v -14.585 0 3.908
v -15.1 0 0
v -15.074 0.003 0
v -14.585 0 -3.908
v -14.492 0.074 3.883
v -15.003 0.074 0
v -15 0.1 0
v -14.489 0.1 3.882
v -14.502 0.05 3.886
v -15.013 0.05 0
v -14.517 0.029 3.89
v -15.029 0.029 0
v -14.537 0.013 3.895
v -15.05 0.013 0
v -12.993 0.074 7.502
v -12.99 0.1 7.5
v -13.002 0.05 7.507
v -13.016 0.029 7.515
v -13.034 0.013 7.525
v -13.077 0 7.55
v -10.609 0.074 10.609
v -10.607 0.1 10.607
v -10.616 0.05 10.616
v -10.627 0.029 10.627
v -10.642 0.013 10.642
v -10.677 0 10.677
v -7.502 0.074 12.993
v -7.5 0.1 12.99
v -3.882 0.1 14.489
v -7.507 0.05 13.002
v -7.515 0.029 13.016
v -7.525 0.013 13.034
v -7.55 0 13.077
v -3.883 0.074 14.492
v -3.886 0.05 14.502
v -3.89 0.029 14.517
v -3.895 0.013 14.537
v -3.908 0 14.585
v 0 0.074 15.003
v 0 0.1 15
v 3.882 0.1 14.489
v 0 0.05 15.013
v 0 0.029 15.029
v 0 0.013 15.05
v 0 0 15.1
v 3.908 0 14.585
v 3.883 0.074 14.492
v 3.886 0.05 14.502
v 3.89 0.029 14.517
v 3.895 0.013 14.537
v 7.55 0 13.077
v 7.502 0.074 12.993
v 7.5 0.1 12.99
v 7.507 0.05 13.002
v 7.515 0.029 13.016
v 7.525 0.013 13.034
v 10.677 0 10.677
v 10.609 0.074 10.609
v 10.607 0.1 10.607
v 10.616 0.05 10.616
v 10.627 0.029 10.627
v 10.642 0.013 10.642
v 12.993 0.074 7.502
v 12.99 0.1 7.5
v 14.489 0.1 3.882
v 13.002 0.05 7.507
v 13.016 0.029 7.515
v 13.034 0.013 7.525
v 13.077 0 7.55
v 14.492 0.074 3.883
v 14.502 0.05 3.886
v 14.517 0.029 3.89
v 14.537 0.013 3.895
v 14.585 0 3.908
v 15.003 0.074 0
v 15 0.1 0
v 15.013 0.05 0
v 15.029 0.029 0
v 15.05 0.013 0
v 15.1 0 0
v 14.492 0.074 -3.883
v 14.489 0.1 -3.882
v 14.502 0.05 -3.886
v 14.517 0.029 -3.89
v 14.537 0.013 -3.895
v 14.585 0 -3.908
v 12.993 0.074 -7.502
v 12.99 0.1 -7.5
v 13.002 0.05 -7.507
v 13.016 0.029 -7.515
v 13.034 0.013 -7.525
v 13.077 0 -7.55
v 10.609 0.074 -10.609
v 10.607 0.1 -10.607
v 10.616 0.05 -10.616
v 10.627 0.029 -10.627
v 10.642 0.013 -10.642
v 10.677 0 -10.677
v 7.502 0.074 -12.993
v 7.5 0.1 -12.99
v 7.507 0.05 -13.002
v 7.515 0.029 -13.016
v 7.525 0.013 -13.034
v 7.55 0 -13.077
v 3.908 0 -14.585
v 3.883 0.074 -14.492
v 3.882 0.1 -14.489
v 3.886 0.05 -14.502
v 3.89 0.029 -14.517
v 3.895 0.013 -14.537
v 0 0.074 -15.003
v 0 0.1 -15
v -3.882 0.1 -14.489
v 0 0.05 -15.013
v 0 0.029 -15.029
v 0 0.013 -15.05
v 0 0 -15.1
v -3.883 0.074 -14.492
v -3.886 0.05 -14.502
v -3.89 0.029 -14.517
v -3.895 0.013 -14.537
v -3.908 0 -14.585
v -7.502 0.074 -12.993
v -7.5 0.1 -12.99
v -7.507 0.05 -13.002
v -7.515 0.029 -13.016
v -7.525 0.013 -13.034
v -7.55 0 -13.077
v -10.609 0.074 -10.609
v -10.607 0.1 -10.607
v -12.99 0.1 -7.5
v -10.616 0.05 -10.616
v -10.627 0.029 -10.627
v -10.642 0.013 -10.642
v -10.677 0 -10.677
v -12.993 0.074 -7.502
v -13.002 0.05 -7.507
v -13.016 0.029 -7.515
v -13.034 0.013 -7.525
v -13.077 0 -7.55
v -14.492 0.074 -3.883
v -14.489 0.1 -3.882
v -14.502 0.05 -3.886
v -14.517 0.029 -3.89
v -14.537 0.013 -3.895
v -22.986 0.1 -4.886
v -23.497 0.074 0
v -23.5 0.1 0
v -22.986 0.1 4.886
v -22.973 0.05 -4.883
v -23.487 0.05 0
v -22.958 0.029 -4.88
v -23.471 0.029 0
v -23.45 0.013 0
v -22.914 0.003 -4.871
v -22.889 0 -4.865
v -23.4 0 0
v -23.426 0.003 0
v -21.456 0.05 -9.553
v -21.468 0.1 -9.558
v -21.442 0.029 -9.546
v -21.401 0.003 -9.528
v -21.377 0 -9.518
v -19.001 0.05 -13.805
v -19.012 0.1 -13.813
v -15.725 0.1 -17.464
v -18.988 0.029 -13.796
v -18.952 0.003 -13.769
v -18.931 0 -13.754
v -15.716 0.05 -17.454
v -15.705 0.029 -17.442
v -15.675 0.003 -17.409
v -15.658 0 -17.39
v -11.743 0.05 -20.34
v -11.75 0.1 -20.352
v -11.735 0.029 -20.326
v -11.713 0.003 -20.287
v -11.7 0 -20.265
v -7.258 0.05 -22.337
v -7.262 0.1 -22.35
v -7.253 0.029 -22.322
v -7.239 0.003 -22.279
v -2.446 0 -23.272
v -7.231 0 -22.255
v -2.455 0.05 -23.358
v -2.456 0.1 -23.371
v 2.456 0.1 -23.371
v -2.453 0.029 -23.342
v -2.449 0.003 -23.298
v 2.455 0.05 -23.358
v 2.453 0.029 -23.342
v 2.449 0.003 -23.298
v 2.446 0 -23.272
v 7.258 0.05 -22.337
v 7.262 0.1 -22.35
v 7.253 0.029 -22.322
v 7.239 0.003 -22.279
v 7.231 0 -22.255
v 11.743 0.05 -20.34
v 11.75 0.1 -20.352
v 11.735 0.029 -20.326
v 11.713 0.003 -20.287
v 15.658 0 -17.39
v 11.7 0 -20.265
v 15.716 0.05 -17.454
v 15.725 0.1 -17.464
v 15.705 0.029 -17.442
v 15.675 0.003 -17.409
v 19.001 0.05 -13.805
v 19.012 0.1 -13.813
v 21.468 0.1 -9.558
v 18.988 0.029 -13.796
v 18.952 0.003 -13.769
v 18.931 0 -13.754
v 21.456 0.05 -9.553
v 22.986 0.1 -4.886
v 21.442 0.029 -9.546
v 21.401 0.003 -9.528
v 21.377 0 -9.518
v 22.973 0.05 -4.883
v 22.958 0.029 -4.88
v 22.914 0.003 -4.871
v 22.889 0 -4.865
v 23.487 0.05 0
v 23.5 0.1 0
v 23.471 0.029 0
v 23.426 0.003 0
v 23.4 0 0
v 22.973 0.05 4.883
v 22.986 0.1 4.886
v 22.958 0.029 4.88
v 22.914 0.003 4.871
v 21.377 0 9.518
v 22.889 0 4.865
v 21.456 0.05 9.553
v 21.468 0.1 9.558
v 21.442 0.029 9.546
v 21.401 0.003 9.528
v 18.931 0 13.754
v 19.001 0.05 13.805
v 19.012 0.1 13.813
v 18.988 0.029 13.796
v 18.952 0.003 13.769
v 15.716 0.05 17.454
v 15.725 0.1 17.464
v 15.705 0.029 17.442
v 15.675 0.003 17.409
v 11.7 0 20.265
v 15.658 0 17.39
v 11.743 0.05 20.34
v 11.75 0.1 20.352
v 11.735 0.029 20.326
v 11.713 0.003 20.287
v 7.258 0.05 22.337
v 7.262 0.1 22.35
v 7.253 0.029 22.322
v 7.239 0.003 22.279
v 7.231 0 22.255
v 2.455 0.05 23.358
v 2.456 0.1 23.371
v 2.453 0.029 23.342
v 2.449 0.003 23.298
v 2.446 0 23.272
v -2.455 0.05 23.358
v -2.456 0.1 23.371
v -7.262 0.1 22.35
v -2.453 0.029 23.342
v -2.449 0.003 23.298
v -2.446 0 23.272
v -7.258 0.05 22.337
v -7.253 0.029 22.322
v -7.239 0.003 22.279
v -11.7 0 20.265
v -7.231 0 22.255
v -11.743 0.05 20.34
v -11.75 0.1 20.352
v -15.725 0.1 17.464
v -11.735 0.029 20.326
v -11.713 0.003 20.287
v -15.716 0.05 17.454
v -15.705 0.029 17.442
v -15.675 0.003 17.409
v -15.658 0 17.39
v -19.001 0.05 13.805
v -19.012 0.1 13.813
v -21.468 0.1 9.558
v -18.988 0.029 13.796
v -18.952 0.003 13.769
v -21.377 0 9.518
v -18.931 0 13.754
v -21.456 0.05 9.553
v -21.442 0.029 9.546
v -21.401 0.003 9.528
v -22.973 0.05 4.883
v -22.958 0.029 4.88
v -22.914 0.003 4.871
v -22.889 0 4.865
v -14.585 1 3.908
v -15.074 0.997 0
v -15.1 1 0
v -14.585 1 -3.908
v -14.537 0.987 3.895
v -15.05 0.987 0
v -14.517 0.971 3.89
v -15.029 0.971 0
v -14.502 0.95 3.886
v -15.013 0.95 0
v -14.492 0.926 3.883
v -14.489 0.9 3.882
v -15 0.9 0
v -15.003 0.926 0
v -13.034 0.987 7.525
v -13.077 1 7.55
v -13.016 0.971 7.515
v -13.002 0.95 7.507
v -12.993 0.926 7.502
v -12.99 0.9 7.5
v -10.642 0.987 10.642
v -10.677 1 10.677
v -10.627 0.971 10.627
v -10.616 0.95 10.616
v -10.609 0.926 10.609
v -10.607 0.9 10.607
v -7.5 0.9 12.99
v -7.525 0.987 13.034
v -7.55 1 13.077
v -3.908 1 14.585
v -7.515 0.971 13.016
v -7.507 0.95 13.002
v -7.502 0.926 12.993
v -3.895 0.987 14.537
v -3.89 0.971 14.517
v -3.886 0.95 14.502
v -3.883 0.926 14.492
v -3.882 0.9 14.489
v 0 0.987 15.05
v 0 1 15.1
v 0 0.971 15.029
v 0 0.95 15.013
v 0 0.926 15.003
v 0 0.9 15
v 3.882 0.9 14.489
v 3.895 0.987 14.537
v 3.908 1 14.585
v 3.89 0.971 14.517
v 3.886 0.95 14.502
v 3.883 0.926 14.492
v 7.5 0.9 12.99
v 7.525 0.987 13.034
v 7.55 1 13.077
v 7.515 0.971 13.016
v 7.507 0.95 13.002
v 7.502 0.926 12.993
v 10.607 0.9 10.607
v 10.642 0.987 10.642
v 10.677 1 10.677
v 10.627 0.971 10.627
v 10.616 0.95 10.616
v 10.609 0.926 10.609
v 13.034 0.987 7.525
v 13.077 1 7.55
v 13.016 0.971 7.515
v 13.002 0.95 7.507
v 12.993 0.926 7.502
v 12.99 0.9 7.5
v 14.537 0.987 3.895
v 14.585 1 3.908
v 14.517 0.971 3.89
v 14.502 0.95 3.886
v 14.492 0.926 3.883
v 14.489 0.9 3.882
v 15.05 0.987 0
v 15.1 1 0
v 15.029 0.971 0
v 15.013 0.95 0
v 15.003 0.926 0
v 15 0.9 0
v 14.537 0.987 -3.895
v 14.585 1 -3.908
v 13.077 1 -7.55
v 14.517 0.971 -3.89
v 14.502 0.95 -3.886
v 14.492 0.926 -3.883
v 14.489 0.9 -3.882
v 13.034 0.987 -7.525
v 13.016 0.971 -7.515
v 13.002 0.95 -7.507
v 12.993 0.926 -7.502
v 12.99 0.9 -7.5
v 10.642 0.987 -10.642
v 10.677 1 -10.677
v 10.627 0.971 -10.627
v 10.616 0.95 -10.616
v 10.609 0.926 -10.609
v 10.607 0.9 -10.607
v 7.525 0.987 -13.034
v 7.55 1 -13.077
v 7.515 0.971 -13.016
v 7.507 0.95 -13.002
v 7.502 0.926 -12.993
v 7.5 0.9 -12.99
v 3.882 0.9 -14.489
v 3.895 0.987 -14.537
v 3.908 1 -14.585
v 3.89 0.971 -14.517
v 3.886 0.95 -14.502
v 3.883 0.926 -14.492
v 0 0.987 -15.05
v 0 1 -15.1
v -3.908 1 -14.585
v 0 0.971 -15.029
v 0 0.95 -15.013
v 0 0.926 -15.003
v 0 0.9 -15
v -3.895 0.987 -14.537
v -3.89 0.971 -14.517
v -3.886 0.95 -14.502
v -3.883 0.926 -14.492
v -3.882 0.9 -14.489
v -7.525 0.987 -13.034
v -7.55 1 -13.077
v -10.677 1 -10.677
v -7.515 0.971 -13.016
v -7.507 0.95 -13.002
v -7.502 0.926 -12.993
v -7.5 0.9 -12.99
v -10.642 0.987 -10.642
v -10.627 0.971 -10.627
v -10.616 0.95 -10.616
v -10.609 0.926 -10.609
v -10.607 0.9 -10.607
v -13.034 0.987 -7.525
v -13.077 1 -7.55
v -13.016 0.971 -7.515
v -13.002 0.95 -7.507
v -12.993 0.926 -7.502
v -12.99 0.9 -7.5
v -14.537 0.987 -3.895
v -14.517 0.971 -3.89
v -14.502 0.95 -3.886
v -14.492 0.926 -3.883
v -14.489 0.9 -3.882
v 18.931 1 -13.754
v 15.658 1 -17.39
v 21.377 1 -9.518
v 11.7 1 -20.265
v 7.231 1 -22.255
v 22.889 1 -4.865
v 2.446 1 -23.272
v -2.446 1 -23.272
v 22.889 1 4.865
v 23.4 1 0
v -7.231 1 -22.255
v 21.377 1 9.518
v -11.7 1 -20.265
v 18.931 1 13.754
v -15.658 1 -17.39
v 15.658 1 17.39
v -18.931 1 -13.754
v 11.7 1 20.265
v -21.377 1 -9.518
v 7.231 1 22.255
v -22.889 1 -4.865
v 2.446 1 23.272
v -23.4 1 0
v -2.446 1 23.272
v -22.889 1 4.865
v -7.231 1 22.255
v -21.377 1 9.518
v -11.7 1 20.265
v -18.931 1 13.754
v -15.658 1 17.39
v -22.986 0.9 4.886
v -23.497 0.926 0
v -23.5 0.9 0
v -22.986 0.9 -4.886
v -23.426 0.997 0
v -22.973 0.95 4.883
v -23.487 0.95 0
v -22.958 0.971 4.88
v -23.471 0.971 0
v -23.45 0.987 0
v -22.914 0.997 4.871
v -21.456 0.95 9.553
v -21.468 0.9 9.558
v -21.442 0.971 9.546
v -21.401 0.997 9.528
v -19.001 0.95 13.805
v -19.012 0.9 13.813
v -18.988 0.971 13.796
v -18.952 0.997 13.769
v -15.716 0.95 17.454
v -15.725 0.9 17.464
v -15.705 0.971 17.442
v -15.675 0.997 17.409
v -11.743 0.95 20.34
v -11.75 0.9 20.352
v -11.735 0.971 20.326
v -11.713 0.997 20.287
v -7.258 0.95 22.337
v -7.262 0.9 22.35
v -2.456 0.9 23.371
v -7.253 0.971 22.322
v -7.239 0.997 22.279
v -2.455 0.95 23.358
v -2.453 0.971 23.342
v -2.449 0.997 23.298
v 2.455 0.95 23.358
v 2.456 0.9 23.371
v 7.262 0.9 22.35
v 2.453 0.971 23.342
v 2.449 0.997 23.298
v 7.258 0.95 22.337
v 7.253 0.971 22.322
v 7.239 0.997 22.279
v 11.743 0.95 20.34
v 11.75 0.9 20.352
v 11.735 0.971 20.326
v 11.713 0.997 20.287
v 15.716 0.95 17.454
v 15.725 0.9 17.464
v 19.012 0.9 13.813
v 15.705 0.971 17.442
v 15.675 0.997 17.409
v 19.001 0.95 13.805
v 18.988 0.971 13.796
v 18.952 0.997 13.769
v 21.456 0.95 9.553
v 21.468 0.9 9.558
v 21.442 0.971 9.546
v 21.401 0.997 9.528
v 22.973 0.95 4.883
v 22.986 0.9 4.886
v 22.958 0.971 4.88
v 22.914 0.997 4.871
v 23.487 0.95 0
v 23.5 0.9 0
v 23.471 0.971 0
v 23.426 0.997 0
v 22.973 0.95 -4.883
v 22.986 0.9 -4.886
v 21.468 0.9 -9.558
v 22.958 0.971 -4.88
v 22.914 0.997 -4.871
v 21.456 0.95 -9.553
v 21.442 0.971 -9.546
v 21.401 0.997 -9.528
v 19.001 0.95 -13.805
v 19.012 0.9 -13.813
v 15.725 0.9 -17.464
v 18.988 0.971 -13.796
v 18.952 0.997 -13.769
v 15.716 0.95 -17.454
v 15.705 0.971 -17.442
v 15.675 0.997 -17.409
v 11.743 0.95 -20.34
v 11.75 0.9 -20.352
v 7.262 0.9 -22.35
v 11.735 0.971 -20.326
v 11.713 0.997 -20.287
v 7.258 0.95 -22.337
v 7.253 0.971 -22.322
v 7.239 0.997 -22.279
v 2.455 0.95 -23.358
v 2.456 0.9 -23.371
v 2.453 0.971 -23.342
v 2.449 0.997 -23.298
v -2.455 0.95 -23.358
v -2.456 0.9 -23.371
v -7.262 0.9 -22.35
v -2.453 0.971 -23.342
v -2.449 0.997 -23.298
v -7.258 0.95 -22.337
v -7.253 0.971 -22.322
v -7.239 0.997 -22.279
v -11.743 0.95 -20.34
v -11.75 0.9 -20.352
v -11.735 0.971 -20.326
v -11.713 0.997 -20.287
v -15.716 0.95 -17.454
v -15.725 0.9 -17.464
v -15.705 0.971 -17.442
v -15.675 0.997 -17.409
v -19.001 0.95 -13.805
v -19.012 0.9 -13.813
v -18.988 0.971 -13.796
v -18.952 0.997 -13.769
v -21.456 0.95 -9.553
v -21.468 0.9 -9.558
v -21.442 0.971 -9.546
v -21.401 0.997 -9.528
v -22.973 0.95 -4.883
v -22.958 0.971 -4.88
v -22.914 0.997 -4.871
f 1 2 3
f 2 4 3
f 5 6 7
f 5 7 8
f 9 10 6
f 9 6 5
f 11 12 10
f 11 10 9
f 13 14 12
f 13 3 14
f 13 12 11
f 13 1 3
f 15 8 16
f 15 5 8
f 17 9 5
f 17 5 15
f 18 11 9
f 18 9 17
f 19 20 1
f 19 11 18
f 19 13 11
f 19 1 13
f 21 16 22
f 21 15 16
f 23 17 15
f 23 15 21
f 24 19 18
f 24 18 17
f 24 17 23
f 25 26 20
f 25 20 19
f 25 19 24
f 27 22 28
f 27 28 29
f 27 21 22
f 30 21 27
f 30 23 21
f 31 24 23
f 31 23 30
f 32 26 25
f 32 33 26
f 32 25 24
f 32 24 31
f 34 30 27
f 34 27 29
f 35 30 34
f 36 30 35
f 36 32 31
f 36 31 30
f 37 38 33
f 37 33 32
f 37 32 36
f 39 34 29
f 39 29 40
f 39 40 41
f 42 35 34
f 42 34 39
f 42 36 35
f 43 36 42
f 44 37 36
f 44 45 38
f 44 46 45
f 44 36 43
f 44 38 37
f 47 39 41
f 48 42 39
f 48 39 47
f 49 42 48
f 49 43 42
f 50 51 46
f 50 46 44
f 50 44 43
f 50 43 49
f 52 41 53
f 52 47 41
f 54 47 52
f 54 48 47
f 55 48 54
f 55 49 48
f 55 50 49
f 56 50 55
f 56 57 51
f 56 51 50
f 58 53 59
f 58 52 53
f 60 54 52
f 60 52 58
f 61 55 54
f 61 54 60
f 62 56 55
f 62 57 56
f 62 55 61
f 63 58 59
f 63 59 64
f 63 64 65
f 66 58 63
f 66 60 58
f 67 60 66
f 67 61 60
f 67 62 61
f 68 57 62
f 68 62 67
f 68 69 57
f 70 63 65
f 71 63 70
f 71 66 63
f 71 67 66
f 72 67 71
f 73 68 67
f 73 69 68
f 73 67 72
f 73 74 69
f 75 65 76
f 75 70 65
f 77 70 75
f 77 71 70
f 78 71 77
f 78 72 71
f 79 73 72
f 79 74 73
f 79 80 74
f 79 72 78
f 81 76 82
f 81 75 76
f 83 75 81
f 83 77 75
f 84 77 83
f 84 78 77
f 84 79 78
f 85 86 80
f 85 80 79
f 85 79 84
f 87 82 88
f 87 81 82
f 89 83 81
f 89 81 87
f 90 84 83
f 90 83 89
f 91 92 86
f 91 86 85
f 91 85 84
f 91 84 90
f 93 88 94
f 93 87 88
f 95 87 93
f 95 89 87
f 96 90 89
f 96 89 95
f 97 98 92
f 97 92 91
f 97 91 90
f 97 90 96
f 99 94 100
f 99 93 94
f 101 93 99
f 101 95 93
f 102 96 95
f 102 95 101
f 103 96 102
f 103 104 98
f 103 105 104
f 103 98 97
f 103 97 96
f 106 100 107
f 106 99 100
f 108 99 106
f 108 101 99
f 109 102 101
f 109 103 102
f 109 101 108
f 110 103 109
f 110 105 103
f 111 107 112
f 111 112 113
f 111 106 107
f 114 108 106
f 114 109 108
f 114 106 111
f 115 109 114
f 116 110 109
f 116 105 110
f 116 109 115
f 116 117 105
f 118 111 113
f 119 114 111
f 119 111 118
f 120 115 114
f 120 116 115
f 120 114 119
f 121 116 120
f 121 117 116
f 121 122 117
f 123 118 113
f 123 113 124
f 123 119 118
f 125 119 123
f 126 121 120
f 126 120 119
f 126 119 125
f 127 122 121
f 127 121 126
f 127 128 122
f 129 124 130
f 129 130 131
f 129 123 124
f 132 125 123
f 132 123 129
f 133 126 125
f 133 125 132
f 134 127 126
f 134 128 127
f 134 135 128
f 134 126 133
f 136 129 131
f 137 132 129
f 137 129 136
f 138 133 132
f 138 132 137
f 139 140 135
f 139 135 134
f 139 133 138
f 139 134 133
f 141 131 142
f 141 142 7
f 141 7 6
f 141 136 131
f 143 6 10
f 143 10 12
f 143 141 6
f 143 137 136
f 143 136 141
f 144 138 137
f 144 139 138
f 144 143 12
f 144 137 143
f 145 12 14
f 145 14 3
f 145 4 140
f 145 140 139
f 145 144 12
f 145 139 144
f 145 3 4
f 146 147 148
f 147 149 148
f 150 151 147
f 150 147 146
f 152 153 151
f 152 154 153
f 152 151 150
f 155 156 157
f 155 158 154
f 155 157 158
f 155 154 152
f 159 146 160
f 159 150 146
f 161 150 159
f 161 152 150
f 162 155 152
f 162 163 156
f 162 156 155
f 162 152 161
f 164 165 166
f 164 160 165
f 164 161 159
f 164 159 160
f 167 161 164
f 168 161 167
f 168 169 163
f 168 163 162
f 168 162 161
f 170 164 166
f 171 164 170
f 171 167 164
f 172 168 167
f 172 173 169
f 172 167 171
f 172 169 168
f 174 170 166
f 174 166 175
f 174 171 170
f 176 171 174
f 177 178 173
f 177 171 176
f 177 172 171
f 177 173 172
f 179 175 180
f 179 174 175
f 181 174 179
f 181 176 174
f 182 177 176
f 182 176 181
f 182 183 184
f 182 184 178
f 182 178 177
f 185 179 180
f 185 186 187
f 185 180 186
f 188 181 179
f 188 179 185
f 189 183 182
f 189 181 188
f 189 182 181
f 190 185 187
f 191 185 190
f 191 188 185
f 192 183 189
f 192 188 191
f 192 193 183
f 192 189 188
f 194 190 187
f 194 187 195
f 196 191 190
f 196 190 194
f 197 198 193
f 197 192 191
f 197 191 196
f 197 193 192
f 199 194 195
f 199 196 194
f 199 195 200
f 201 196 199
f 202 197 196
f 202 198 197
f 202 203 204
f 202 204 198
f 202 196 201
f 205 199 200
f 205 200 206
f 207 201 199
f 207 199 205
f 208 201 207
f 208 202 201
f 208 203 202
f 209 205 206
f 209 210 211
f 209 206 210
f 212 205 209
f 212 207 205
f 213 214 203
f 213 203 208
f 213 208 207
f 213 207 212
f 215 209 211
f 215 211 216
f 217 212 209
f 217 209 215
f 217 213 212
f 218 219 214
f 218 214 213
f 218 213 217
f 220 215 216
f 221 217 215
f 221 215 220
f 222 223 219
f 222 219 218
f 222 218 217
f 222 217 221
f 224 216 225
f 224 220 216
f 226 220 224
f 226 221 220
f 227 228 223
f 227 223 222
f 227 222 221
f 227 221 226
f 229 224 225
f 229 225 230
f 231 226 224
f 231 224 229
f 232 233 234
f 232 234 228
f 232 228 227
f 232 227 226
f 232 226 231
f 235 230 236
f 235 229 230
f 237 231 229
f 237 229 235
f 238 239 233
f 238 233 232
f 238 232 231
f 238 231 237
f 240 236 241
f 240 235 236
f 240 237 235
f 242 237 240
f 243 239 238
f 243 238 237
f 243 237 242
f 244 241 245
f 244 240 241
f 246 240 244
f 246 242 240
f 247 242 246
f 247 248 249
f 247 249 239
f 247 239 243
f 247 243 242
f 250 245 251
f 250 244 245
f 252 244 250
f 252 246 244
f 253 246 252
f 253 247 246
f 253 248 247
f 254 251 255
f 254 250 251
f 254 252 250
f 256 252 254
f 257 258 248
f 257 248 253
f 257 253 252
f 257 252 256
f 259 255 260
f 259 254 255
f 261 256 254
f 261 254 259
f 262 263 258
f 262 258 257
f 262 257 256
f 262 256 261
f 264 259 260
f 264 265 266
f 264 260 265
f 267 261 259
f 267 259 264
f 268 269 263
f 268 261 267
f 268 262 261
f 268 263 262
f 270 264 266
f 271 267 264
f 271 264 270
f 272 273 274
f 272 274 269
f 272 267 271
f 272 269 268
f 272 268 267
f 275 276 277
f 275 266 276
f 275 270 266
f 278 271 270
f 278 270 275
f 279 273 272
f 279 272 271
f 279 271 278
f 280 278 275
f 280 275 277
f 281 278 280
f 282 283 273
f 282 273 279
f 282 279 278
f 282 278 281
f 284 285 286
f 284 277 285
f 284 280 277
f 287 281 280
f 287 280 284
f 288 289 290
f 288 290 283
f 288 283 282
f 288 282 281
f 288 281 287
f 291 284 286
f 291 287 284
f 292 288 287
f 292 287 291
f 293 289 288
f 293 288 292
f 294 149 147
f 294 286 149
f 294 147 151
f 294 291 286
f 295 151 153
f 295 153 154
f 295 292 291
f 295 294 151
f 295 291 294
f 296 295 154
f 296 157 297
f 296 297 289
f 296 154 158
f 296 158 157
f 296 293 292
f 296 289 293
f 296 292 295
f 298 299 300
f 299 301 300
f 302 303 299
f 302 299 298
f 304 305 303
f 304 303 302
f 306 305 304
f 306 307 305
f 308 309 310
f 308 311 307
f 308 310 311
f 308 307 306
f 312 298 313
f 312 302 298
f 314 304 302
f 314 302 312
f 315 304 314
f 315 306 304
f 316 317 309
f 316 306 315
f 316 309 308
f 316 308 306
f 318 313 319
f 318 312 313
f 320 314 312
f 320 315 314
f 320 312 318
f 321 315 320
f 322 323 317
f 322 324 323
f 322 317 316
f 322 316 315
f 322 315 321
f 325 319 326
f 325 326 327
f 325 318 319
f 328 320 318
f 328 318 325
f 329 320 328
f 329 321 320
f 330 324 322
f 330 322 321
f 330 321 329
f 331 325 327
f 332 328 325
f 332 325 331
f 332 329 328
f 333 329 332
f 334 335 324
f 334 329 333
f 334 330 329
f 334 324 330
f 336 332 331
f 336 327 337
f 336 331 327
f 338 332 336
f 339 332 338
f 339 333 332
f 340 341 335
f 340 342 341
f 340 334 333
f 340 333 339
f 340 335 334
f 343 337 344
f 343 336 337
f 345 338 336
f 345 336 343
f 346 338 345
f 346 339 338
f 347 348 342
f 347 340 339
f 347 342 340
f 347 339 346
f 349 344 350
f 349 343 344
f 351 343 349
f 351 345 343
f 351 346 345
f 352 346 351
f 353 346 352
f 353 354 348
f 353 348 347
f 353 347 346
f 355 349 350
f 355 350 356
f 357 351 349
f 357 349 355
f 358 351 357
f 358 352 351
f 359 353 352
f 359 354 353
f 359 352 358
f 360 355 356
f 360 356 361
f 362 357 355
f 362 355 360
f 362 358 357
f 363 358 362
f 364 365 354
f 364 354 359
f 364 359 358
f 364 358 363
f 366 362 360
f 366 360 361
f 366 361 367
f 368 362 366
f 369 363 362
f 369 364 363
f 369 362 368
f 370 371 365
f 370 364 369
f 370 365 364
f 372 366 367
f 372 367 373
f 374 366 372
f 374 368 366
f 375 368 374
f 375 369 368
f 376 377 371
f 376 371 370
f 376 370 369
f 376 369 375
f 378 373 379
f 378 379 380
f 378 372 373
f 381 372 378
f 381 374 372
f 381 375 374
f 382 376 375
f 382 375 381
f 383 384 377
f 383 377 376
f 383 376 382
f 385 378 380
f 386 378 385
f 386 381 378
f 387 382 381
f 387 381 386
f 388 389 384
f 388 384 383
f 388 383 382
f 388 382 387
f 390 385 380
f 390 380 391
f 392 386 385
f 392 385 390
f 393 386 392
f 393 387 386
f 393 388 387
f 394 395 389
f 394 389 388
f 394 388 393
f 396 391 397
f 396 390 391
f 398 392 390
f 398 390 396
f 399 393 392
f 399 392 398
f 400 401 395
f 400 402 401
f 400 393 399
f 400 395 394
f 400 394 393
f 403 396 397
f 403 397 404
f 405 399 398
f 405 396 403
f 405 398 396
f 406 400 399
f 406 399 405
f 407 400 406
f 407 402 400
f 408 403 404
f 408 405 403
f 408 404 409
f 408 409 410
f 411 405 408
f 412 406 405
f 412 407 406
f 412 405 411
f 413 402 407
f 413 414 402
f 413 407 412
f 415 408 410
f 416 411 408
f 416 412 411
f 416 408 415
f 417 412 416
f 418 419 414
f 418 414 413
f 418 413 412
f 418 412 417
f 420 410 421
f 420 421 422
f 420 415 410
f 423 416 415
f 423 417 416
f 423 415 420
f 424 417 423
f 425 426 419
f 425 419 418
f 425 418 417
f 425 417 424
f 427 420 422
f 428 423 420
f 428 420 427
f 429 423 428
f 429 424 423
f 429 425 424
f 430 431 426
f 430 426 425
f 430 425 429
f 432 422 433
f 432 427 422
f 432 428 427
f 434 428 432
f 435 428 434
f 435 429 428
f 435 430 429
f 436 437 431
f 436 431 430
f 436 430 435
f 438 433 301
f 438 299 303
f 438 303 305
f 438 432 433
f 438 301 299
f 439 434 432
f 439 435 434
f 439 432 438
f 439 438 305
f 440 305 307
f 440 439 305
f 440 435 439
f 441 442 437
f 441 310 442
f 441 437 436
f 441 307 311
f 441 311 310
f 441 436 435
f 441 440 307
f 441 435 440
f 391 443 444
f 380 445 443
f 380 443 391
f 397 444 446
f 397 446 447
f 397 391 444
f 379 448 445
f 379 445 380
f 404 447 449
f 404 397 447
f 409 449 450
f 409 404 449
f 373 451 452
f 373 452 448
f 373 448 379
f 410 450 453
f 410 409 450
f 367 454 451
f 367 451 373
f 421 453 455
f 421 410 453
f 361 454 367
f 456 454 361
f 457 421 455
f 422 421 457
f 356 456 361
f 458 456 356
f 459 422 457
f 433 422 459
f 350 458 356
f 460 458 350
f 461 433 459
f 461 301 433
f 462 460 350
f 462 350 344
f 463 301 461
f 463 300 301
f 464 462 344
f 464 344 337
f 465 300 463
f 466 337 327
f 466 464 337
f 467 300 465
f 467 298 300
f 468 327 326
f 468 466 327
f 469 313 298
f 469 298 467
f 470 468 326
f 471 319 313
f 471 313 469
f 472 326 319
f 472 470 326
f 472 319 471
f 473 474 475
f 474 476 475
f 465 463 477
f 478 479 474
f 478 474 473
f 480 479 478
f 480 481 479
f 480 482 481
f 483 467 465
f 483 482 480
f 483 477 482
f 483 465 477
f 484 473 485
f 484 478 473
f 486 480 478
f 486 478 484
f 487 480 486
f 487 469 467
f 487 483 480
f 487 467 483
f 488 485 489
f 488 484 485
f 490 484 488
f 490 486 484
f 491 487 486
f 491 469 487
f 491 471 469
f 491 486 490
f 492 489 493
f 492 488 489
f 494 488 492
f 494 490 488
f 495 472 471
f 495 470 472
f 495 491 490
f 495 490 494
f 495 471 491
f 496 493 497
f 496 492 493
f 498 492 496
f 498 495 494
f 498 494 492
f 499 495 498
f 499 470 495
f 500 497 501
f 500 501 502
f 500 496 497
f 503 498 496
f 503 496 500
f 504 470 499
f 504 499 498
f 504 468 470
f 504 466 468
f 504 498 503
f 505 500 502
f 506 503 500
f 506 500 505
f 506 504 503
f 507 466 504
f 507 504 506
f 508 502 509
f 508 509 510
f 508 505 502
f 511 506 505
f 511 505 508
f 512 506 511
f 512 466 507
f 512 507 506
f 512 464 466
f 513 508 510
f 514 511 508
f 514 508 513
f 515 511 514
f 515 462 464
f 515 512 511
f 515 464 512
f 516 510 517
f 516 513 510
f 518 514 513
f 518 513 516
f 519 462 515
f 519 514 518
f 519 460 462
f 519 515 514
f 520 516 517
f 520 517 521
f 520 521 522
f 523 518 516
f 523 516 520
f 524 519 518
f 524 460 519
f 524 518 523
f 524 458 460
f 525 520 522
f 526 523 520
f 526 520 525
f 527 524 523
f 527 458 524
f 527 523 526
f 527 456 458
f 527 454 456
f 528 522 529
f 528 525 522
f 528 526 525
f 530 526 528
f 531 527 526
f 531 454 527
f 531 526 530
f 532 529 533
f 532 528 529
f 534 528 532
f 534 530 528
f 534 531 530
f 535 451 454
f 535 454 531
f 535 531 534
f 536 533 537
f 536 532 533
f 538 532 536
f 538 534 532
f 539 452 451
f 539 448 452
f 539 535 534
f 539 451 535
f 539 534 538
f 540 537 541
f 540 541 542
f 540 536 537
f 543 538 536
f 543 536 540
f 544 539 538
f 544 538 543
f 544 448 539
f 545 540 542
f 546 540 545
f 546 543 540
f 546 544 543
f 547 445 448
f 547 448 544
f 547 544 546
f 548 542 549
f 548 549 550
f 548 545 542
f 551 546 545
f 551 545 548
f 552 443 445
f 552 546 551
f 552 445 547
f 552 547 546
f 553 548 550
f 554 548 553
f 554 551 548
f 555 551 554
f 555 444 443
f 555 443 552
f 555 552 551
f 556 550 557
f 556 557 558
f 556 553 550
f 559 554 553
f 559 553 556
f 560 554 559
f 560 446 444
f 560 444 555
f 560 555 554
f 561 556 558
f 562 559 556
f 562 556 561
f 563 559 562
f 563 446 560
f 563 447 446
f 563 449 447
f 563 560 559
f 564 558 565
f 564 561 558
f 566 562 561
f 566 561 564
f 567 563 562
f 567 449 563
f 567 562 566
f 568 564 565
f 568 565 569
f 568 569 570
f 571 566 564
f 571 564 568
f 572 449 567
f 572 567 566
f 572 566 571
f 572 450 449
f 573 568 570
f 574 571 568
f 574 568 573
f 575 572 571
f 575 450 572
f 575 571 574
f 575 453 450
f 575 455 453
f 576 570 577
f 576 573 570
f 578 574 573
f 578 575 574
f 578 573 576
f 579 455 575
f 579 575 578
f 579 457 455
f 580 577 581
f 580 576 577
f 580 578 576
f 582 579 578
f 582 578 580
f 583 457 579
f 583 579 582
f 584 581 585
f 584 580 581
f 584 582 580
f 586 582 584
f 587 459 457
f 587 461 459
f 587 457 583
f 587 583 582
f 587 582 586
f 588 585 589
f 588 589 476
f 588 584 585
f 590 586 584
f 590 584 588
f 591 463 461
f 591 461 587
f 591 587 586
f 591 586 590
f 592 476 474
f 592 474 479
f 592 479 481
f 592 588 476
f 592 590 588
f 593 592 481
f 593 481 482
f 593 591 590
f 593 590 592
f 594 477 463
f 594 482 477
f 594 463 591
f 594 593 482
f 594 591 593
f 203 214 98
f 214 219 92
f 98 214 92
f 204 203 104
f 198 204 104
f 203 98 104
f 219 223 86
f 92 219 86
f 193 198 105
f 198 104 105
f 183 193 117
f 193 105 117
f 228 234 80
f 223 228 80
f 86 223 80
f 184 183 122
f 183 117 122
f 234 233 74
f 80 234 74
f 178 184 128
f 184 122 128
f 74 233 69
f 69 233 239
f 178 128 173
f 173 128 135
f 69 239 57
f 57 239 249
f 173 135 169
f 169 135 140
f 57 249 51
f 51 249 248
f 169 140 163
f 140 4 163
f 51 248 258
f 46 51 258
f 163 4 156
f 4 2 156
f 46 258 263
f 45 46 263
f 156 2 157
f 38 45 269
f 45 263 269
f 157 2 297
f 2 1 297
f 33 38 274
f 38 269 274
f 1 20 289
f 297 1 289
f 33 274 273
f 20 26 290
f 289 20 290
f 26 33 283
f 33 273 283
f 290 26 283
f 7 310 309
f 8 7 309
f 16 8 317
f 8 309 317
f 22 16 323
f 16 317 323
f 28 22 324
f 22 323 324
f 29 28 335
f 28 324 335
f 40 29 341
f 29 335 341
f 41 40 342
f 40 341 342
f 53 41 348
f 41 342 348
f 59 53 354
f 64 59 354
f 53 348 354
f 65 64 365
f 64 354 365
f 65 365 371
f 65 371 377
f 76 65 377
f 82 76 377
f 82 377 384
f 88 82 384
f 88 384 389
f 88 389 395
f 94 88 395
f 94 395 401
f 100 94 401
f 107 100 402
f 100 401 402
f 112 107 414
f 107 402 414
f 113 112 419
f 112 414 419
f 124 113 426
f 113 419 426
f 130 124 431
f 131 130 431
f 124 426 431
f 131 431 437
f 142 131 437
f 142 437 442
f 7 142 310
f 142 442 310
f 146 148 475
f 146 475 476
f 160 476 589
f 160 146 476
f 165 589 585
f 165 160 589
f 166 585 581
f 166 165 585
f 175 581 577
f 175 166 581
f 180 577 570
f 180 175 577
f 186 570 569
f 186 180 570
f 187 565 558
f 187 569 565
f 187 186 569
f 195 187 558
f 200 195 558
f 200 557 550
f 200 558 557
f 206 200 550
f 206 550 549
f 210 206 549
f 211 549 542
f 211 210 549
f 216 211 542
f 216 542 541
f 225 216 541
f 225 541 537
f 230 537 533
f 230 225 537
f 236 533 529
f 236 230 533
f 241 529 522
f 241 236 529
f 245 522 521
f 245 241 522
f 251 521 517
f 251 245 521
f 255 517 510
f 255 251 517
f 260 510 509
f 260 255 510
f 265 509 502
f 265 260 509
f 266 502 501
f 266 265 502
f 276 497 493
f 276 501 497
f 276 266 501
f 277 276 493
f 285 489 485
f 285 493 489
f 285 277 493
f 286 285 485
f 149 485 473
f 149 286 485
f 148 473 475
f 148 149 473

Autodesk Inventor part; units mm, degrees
ref_plane "YZ Plane" through (0, 0, 0) normal (1, 0, 0) x (0, 1, 0)
ref_plane "XZ Plane" through (0, 0, 0) normal (0, 1, 0) x (-1, 0, 0)
ref_plane "XY Plane" through (0, 0, 0) normal (0, 0, 1) x (1, 0, 0)
sketch "Skizze outline for Körper" plane through (0, 0, 0) normal (0, 0, 1) x (1, 0, 0)
  line L0 (-23.5, 0) -> (-15, 0)
  line L1 (-23.5, 1) -> (-23.5, 0)
  line L2 (-15, 1) -> (-23.5, 1)
  line L3 (-15, 0) -> (-15, 1)
revolve "Körper" add sketch "Skizze outline for Körper" angle 360 about axis through (0, -10, 0) along (0, 1, 0)
fillet "Rundung1" radius 0.1 4 edges at (23.5, 0, 0) (23.5, 1, 0) (15, 0, 0) (15, 1, 0)
sketch "Skizze" plane through (0, 0, 0) normal (0, 0, 1) x (1, 0, 0)
  line L0 (-23.5, 0) -> (-23.5, 1)
  line L1 (-23.5, 1) -> (-15, 1)
  line L2 (-15, 1) -> (-15, 0)
  line L3 (-94, 0) -> (-66, 0) projected
  line L4 (0, -0.5) -> (0, 3) projected
  dimension "d2" = 1
  dimension "d4" = 30
  dimension "d5" = 47
equation "\"d0\" = 0.1 * KB"
equation "\"d2\" = KB"
equation "\"d4\" = WD"
equation "\"d5\" = BD"
equation "\"WD\" = 30"
equation "\"BD\" = 47"
equation "\"KB\" = 1"
equation "\"BBA\" = 90deg"
equation "\"BR\" = 0.5 * BD"
equation "\"WR\" = 0.5 * WD"
properties part number "DIN 5405 T3 - AS3047 - 30 x 47 x 1" material "Stahl, weich"
